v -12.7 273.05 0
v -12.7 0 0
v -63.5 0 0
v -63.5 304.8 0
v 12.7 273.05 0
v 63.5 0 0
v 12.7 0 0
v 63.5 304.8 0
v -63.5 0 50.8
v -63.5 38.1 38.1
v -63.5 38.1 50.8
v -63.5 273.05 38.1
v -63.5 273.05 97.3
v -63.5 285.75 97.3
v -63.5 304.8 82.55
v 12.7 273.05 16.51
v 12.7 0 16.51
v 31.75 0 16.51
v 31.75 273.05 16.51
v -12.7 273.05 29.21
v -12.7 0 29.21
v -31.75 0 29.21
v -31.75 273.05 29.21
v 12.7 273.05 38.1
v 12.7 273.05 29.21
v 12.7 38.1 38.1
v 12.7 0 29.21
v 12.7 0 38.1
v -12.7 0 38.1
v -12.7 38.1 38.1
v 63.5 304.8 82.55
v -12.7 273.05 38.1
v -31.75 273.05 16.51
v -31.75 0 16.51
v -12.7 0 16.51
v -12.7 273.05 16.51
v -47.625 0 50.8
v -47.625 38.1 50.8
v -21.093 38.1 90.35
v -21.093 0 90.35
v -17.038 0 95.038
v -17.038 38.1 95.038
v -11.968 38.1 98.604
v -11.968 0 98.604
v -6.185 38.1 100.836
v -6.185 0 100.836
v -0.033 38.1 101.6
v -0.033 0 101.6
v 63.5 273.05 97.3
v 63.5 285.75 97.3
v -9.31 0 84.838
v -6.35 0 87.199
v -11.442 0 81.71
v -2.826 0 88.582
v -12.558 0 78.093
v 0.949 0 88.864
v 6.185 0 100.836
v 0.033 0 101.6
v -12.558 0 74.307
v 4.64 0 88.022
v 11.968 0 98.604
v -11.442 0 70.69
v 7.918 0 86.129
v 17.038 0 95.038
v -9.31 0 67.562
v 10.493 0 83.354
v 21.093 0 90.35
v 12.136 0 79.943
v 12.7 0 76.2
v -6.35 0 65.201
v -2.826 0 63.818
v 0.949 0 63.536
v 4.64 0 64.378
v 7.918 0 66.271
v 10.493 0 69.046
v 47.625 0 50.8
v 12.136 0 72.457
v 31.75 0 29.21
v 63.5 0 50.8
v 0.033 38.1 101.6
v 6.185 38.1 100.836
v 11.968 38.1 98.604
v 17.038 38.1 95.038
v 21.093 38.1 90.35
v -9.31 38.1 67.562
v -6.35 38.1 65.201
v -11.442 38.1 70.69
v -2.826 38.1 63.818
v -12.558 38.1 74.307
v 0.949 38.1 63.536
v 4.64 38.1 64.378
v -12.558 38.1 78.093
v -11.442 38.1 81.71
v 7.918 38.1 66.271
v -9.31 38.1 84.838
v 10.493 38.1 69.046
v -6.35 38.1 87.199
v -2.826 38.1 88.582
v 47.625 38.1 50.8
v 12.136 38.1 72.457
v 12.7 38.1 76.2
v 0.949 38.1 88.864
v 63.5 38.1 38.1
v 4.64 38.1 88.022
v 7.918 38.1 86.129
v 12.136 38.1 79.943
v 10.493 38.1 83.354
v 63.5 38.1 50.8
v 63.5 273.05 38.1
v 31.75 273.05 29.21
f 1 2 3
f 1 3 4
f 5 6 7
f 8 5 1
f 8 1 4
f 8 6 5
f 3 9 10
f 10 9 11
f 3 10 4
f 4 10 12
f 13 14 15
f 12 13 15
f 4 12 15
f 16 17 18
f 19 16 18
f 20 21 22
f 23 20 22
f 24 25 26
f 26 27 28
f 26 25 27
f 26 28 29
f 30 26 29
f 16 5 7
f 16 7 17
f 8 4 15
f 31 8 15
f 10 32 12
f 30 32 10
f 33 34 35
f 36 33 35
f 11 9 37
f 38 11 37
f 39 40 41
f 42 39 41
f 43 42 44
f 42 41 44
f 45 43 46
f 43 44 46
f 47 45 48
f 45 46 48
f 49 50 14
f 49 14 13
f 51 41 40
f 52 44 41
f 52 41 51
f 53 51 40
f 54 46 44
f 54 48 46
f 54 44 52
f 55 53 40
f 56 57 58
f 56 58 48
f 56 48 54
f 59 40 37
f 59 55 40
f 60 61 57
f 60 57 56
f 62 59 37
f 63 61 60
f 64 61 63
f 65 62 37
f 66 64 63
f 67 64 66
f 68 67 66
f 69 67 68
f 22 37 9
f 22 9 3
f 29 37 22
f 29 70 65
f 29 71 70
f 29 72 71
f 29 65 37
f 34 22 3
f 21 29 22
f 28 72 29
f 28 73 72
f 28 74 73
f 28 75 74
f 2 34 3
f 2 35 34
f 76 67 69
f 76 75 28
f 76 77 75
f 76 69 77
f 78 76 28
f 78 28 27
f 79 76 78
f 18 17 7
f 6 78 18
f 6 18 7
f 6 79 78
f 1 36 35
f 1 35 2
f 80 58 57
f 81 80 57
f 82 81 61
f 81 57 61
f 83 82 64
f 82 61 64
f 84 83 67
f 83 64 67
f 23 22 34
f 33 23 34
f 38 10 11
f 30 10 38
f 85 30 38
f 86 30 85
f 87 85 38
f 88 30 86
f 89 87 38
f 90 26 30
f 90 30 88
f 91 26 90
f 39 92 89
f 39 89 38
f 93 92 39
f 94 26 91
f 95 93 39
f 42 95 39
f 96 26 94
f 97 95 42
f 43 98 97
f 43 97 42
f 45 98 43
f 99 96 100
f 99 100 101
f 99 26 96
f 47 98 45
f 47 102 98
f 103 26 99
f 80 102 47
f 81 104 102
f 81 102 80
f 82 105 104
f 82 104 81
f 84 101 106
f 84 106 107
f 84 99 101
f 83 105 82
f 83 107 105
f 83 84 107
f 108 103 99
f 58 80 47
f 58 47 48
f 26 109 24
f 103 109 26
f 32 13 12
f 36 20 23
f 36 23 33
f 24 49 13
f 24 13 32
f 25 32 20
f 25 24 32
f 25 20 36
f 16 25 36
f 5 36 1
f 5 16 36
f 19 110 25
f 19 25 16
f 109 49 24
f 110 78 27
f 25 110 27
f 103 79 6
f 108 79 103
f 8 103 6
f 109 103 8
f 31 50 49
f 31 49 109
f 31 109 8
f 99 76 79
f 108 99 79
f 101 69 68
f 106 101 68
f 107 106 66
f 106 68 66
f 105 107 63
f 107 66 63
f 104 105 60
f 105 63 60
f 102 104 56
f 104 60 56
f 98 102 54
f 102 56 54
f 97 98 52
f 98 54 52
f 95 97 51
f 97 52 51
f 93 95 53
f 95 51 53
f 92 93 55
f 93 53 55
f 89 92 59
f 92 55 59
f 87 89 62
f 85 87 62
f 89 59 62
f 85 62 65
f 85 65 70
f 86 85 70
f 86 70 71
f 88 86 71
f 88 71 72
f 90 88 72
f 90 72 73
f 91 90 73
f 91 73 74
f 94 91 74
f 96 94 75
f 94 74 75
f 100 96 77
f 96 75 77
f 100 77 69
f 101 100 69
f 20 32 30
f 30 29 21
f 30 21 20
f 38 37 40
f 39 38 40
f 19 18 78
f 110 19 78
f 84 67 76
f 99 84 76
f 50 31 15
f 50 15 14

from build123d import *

# Parameters (mm, degrees)
F2_DEPTH = 63.5
F3_DEPTH = 273.05
F0_R     = 12.7
F4_DEPTH = 38.1


with BuildPart() as f2:
    # F1 (on Right) → F2 (new body, symmetric)
    with BuildSketch(Plane.YZ):
        Polygon((0, 101.6), (0, 0), (304.8, 0), (304.8, 82.55), (285.75, 97.29961), (273.05, 97.29961), (273.05, 38.1), (38.1, 38.1), (38.1, 101.6), align=None)
    extrude(amount=F2_DEPTH, both=True)

    # F0 (on Front) → F3 (cut)
    with BuildSketch(Plane.XZ):
        Polygon((-12.7, 16.51), (-12.7, 0), (12.7, 0), (12.7, 16.51), (31.75, 16.51), (31.75, 29.21), (12.7, 29.21), (12.7, 38.1), (-12.7, 38.1), (-12.7, 29.21), (-31.75, 29.21), (-31.75, 16.51), align=None)
    extrude(amount=-F3_DEPTH, mode=Mode.SUBTRACT)

    # F0 (on Front) → F4 (cut)
    with BuildSketch(Plane.XZ):
        with BuildLine():
            Line((-63.5, 101.600022), (-63.5, 50.8))
            Line((-63.5, 50.8), (-47.625, 50.8))
            Line((-47.625, 50.8), (-21.093444, 90.350185))
            ThreePointArc((-21.093444, 90.350185), (-11.952951, 98.611784), (0, 101.600022))
            Line((0, 101.600022), (-63.5, 101.600022))
        make_face()
        with BuildLine():
            Line((47.625, 50.8), (63.5, 50.8))
            Line((63.5, 50.8), (63.5, 101.600022))
            Line((63.5, 101.600022), (0, 101.600022))
            ThreePointArc((0, 101.600022), (11.952951, 98.611784), (21.093444, 90.350185))
            Line((21.093444, 90.350185), (47.625, 50.8))
        make_face()
        with Locations((0, 76.2)):
            Circle(F0_R)
    extrude(amount=-F4_DEPTH, mode=Mode.SUBTRACT)


solid = f2.part
